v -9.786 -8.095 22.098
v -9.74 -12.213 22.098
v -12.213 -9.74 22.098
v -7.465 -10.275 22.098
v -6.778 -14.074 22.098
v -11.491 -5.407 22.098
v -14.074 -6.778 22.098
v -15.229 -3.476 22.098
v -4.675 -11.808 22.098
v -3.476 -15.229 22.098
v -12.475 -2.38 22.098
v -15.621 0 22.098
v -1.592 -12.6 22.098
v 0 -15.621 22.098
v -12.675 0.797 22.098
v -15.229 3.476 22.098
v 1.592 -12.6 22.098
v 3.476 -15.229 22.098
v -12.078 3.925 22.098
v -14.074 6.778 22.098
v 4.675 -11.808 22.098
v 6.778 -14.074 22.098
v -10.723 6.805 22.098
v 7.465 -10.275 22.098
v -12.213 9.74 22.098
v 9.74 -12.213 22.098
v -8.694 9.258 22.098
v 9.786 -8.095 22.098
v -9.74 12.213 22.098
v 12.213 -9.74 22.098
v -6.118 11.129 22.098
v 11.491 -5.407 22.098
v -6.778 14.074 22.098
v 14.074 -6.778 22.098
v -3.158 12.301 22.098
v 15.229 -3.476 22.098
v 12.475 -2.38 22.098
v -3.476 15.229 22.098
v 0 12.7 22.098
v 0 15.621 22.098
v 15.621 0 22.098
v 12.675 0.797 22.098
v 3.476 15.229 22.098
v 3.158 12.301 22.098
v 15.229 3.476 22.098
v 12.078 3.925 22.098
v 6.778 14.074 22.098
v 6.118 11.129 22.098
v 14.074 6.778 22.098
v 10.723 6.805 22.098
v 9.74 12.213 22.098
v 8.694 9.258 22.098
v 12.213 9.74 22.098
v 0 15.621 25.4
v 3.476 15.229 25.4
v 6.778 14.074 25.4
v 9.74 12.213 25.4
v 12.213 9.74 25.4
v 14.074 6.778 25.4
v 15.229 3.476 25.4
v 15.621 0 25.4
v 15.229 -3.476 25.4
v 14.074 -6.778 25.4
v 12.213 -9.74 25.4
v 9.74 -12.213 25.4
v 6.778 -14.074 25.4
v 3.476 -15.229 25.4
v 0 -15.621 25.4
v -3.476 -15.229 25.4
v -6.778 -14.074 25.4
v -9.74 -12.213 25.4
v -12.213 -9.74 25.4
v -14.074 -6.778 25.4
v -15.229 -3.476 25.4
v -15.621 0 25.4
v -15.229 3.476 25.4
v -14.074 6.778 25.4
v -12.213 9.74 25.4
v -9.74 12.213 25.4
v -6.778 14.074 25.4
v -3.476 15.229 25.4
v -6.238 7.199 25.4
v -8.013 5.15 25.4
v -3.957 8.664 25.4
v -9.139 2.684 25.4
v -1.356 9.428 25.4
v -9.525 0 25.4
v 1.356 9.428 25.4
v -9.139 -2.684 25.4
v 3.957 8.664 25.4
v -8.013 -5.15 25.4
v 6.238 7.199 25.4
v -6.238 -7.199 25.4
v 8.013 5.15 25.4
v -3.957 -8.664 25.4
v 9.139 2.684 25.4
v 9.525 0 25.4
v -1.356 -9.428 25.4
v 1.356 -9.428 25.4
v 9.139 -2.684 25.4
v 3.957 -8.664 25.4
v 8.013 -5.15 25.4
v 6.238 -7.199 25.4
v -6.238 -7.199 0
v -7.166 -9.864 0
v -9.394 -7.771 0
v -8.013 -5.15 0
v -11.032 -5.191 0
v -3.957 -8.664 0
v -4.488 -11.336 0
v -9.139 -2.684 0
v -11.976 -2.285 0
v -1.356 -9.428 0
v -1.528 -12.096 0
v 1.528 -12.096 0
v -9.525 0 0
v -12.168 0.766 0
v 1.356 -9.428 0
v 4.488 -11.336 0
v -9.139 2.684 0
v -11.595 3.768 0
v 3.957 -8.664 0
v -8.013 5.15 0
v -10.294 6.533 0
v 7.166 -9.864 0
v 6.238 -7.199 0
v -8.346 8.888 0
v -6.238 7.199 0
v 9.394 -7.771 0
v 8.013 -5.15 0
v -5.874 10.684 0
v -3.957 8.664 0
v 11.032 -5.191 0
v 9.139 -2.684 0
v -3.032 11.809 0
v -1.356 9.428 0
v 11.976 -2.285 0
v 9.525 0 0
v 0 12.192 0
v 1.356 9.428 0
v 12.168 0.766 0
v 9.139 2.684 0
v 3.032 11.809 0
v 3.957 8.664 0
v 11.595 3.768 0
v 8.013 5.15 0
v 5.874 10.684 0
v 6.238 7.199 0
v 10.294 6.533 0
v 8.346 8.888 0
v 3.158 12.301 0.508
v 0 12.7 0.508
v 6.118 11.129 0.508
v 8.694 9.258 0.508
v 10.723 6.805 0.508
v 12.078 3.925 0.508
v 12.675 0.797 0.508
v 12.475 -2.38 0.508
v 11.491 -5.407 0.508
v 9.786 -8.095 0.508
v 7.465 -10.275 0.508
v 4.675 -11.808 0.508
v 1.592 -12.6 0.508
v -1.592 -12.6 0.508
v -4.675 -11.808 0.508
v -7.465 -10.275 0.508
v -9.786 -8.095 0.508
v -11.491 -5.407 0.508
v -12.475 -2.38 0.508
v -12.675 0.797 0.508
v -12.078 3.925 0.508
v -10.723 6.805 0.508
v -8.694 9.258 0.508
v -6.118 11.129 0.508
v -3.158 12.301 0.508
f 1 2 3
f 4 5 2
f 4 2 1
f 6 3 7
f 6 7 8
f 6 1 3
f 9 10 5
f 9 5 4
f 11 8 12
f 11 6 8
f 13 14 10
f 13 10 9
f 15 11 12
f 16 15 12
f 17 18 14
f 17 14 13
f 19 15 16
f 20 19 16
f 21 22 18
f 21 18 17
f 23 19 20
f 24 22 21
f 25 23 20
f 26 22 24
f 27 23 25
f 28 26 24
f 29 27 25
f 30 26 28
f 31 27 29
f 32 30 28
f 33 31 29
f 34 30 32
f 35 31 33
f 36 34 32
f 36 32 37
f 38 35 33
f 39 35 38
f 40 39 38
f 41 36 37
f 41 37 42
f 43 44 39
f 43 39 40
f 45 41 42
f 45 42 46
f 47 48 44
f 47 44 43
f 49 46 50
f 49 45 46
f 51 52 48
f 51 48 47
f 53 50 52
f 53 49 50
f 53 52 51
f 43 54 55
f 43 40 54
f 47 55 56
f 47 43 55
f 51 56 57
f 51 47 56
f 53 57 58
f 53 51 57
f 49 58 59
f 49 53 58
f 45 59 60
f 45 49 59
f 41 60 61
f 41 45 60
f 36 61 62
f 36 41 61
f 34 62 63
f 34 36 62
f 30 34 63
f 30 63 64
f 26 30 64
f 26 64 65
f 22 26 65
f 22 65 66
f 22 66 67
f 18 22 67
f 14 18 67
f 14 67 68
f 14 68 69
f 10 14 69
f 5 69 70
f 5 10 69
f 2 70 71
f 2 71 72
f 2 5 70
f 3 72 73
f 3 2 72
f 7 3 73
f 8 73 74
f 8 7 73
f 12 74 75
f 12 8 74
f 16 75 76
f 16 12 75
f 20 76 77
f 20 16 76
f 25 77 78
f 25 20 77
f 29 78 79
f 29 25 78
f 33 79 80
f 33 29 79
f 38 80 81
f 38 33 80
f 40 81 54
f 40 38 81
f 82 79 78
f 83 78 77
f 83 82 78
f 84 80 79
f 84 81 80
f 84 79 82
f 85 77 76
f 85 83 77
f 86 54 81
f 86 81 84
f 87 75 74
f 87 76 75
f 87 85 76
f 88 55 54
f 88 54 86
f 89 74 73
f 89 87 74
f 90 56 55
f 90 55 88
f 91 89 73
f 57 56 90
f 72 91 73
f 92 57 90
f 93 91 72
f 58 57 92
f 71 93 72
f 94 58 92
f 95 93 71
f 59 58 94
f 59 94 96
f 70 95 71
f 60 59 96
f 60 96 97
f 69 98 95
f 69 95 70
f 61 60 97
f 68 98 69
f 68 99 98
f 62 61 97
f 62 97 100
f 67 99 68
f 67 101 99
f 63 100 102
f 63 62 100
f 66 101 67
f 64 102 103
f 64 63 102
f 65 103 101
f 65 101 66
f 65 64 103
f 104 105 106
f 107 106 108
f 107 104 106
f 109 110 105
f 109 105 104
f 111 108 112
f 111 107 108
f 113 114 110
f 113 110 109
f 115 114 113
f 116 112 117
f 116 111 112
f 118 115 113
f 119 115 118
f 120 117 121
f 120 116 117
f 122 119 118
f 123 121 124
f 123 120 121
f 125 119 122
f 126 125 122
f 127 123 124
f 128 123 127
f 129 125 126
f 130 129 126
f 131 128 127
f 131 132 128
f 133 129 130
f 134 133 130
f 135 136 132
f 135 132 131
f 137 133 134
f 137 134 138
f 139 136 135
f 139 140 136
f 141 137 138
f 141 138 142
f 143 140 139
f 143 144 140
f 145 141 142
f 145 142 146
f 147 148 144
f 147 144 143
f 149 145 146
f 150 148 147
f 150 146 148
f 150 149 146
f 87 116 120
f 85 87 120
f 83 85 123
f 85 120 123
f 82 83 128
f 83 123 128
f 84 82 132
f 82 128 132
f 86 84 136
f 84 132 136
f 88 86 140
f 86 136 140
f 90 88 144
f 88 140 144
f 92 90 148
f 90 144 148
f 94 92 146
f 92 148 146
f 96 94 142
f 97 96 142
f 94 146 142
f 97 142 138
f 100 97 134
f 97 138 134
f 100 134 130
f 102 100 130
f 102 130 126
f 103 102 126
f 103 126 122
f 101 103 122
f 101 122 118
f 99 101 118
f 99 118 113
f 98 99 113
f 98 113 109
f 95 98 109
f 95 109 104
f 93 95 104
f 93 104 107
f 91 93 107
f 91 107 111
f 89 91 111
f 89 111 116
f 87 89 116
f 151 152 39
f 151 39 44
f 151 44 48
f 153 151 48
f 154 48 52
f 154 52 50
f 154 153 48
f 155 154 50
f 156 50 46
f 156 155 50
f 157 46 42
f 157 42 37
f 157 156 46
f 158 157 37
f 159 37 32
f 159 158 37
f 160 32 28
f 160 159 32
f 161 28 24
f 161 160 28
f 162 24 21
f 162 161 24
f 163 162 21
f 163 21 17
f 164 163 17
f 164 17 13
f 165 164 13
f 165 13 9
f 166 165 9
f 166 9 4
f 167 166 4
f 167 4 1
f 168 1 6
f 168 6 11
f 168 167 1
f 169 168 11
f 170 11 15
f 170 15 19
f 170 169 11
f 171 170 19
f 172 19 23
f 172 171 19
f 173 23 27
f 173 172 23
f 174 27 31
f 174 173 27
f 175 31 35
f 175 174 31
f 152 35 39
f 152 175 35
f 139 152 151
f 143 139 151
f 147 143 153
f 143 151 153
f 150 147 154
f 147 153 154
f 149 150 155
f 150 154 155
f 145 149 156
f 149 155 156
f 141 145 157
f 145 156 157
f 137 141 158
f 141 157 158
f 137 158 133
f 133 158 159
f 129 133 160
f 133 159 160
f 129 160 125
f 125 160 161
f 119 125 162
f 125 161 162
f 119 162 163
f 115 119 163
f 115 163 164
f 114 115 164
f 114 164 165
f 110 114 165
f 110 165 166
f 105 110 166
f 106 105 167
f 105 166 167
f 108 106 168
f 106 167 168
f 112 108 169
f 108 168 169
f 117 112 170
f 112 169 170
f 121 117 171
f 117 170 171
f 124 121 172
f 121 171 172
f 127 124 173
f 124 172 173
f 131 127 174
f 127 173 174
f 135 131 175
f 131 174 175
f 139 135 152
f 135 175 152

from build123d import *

# Parameters (mm, degrees)
F_1_4_0_75_DIAMETER_HOLE1_D = 19.05
CHAMFER1_SIZE               = 0.508


with BuildPart() as part:
    # Sketch1 → Revolve1 (revolve)
    with BuildSketch(Plane(origin=(0, 0, 0), x_dir=(0, 0, -1), z_dir=(1, 0, 0))):
        Polygon((0, 0), (-25.4, 0), (-25.4, 15.621), (-22.098, 15.621), (-22.098, 12.7), (0, 12.7), align=None)
    revolve(axis=Axis((0, 0, 0), (0, 0, -1)))

    # 1/4 (0.75) Diameter Hole1 (through all)
    with Locations(Plane.XY.offset(25.4)):
        with Locations((0, 0)):
            Hole(F_1_4_0_75_DIAMETER_HOLE1_D / 2)

    # Chamfer1
    chamfer1_edges = [part.edges().sort_by_distance(p)[0] for p in [
        (0, -12.7, 0),
    ]]
    chamfer(chamfer1_edges, length=CHAMFER1_SIZE)


solid = part.part
